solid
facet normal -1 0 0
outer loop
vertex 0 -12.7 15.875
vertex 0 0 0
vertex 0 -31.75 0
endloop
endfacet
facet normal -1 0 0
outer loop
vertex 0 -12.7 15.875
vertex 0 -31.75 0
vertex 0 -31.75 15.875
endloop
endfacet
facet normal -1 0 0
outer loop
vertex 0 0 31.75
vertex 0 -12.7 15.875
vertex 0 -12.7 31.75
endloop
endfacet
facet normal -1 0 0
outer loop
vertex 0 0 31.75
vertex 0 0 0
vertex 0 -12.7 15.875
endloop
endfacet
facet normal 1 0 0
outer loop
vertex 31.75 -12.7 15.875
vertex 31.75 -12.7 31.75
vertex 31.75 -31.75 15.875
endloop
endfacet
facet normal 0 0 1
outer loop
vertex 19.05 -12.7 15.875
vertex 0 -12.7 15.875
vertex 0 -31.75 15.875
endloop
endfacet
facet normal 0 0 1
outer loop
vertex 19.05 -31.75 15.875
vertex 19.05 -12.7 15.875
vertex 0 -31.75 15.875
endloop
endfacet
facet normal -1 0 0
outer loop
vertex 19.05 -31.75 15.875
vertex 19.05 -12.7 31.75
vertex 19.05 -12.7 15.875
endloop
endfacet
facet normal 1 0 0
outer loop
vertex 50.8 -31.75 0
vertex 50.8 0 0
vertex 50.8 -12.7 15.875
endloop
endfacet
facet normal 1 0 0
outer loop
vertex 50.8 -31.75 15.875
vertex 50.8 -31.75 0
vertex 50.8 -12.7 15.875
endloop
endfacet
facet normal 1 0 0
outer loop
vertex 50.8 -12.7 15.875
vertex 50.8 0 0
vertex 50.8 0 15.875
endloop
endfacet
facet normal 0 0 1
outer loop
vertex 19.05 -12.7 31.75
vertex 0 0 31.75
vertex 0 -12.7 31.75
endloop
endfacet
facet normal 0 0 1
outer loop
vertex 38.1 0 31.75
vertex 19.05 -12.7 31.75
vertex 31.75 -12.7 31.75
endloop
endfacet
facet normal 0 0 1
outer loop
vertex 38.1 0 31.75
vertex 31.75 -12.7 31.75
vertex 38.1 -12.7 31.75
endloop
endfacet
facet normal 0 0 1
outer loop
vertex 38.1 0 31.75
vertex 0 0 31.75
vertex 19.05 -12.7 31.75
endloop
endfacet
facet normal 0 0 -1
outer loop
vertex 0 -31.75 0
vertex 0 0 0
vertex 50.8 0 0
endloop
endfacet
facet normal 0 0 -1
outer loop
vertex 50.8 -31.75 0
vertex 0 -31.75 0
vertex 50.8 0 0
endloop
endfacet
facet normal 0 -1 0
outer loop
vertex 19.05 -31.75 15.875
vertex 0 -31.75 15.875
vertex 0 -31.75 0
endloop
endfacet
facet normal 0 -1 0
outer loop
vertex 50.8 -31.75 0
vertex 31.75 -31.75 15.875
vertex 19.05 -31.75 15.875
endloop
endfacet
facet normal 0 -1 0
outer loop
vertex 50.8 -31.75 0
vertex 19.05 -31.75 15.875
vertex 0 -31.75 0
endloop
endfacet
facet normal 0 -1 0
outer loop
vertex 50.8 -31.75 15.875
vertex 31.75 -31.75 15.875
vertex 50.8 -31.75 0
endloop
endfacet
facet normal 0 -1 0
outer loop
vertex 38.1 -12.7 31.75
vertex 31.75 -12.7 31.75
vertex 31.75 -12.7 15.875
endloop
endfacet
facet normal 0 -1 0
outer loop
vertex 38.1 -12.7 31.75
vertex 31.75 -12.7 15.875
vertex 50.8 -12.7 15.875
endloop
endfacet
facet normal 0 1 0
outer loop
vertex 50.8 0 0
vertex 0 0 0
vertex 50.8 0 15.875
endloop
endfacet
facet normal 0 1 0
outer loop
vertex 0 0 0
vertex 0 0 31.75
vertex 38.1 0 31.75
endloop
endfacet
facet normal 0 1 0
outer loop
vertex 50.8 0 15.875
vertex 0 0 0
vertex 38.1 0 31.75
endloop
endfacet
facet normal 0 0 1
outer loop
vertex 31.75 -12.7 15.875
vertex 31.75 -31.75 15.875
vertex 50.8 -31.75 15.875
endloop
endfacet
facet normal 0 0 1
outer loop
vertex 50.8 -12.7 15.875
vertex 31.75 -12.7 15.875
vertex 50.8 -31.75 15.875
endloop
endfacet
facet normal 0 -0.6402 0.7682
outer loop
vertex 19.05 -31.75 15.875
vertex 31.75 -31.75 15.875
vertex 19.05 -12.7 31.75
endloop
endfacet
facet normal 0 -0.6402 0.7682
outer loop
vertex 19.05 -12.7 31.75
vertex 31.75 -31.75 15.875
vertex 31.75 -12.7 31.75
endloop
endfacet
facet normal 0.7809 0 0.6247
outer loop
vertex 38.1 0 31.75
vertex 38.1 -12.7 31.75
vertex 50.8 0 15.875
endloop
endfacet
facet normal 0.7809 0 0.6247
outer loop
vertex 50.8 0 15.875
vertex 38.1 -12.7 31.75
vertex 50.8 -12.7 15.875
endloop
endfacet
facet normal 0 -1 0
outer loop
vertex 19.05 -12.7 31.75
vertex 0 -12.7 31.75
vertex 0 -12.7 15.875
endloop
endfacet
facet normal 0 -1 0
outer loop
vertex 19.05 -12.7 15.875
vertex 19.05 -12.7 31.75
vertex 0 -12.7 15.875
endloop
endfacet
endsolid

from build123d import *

# Parameters (mm, degrees)
F0_W      = 50.8
F0_H      = 31.75
F1_DEPTH  = 31.75
F3_DEPTH  = 12.7
F4_DEPTH  = 19.05
F6_DEPTH  = 19.05
F8_DEPTH  = 31.75
F10_DEPTH = 19.05


with BuildPart() as f1:
    # F0 (on Front) → F1 (new body)
    with BuildSketch(Plane.XZ):
        with Locations((25.4, 15.875)):
            Rectangle(F0_W, F0_H)
    extrude(amount=F1_DEPTH)

    # F2 (on face) → F3 (cut)
    with BuildSketch(Plane.XZ.offset(31.75)):
        Polygon((50.8, 31.75), (38.1, 31.75), (50.8, 15.875), align=None)
    extrude(amount=-F3_DEPTH, mode=Mode.SUBTRACT)

    # F4 (cut): a face of the model
    f4_faces = [f1.faces().sort_by_distance(p)[0] for p in [
        (46.5666666667, -19.05, 26.4583333333),
    ]]
    extrude(f4_faces, amount=-F4_DEPTH, mode=Mode.SUBTRACT)

    # F5 (on face) → F6 (cut)
    with BuildSketch(Plane.XZ.offset(31.75)):
        Polygon((38.1, 31.75), (31.75, 31.75), (31.75, 15.875), (50.8, 15.875), align=None)
    extrude(amount=-F6_DEPTH, mode=Mode.SUBTRACT)

    # F7 (on face) → F8 (cut)
    with BuildSketch(Plane.YZ.offset(31.75)):
        Polygon((-31.75, 15.875), (-12.7, 31.75), (-31.75, 31.75), align=None)
    extrude(amount=-F8_DEPTH, mode=Mode.SUBTRACT)

    # F9 (on face) → F10 (cut)
    with BuildSketch(Plane(origin=(0, 0, 0), x_dir=(0, -1, 0), z_dir=(-1, 0, 0))):
        Polygon((31.75, 15.875), (12.7, 31.75), (12.7, 15.875), align=None)
    extrude(amount=-F10_DEPTH, mode=Mode.SUBTRACT)


solid = f1.part
